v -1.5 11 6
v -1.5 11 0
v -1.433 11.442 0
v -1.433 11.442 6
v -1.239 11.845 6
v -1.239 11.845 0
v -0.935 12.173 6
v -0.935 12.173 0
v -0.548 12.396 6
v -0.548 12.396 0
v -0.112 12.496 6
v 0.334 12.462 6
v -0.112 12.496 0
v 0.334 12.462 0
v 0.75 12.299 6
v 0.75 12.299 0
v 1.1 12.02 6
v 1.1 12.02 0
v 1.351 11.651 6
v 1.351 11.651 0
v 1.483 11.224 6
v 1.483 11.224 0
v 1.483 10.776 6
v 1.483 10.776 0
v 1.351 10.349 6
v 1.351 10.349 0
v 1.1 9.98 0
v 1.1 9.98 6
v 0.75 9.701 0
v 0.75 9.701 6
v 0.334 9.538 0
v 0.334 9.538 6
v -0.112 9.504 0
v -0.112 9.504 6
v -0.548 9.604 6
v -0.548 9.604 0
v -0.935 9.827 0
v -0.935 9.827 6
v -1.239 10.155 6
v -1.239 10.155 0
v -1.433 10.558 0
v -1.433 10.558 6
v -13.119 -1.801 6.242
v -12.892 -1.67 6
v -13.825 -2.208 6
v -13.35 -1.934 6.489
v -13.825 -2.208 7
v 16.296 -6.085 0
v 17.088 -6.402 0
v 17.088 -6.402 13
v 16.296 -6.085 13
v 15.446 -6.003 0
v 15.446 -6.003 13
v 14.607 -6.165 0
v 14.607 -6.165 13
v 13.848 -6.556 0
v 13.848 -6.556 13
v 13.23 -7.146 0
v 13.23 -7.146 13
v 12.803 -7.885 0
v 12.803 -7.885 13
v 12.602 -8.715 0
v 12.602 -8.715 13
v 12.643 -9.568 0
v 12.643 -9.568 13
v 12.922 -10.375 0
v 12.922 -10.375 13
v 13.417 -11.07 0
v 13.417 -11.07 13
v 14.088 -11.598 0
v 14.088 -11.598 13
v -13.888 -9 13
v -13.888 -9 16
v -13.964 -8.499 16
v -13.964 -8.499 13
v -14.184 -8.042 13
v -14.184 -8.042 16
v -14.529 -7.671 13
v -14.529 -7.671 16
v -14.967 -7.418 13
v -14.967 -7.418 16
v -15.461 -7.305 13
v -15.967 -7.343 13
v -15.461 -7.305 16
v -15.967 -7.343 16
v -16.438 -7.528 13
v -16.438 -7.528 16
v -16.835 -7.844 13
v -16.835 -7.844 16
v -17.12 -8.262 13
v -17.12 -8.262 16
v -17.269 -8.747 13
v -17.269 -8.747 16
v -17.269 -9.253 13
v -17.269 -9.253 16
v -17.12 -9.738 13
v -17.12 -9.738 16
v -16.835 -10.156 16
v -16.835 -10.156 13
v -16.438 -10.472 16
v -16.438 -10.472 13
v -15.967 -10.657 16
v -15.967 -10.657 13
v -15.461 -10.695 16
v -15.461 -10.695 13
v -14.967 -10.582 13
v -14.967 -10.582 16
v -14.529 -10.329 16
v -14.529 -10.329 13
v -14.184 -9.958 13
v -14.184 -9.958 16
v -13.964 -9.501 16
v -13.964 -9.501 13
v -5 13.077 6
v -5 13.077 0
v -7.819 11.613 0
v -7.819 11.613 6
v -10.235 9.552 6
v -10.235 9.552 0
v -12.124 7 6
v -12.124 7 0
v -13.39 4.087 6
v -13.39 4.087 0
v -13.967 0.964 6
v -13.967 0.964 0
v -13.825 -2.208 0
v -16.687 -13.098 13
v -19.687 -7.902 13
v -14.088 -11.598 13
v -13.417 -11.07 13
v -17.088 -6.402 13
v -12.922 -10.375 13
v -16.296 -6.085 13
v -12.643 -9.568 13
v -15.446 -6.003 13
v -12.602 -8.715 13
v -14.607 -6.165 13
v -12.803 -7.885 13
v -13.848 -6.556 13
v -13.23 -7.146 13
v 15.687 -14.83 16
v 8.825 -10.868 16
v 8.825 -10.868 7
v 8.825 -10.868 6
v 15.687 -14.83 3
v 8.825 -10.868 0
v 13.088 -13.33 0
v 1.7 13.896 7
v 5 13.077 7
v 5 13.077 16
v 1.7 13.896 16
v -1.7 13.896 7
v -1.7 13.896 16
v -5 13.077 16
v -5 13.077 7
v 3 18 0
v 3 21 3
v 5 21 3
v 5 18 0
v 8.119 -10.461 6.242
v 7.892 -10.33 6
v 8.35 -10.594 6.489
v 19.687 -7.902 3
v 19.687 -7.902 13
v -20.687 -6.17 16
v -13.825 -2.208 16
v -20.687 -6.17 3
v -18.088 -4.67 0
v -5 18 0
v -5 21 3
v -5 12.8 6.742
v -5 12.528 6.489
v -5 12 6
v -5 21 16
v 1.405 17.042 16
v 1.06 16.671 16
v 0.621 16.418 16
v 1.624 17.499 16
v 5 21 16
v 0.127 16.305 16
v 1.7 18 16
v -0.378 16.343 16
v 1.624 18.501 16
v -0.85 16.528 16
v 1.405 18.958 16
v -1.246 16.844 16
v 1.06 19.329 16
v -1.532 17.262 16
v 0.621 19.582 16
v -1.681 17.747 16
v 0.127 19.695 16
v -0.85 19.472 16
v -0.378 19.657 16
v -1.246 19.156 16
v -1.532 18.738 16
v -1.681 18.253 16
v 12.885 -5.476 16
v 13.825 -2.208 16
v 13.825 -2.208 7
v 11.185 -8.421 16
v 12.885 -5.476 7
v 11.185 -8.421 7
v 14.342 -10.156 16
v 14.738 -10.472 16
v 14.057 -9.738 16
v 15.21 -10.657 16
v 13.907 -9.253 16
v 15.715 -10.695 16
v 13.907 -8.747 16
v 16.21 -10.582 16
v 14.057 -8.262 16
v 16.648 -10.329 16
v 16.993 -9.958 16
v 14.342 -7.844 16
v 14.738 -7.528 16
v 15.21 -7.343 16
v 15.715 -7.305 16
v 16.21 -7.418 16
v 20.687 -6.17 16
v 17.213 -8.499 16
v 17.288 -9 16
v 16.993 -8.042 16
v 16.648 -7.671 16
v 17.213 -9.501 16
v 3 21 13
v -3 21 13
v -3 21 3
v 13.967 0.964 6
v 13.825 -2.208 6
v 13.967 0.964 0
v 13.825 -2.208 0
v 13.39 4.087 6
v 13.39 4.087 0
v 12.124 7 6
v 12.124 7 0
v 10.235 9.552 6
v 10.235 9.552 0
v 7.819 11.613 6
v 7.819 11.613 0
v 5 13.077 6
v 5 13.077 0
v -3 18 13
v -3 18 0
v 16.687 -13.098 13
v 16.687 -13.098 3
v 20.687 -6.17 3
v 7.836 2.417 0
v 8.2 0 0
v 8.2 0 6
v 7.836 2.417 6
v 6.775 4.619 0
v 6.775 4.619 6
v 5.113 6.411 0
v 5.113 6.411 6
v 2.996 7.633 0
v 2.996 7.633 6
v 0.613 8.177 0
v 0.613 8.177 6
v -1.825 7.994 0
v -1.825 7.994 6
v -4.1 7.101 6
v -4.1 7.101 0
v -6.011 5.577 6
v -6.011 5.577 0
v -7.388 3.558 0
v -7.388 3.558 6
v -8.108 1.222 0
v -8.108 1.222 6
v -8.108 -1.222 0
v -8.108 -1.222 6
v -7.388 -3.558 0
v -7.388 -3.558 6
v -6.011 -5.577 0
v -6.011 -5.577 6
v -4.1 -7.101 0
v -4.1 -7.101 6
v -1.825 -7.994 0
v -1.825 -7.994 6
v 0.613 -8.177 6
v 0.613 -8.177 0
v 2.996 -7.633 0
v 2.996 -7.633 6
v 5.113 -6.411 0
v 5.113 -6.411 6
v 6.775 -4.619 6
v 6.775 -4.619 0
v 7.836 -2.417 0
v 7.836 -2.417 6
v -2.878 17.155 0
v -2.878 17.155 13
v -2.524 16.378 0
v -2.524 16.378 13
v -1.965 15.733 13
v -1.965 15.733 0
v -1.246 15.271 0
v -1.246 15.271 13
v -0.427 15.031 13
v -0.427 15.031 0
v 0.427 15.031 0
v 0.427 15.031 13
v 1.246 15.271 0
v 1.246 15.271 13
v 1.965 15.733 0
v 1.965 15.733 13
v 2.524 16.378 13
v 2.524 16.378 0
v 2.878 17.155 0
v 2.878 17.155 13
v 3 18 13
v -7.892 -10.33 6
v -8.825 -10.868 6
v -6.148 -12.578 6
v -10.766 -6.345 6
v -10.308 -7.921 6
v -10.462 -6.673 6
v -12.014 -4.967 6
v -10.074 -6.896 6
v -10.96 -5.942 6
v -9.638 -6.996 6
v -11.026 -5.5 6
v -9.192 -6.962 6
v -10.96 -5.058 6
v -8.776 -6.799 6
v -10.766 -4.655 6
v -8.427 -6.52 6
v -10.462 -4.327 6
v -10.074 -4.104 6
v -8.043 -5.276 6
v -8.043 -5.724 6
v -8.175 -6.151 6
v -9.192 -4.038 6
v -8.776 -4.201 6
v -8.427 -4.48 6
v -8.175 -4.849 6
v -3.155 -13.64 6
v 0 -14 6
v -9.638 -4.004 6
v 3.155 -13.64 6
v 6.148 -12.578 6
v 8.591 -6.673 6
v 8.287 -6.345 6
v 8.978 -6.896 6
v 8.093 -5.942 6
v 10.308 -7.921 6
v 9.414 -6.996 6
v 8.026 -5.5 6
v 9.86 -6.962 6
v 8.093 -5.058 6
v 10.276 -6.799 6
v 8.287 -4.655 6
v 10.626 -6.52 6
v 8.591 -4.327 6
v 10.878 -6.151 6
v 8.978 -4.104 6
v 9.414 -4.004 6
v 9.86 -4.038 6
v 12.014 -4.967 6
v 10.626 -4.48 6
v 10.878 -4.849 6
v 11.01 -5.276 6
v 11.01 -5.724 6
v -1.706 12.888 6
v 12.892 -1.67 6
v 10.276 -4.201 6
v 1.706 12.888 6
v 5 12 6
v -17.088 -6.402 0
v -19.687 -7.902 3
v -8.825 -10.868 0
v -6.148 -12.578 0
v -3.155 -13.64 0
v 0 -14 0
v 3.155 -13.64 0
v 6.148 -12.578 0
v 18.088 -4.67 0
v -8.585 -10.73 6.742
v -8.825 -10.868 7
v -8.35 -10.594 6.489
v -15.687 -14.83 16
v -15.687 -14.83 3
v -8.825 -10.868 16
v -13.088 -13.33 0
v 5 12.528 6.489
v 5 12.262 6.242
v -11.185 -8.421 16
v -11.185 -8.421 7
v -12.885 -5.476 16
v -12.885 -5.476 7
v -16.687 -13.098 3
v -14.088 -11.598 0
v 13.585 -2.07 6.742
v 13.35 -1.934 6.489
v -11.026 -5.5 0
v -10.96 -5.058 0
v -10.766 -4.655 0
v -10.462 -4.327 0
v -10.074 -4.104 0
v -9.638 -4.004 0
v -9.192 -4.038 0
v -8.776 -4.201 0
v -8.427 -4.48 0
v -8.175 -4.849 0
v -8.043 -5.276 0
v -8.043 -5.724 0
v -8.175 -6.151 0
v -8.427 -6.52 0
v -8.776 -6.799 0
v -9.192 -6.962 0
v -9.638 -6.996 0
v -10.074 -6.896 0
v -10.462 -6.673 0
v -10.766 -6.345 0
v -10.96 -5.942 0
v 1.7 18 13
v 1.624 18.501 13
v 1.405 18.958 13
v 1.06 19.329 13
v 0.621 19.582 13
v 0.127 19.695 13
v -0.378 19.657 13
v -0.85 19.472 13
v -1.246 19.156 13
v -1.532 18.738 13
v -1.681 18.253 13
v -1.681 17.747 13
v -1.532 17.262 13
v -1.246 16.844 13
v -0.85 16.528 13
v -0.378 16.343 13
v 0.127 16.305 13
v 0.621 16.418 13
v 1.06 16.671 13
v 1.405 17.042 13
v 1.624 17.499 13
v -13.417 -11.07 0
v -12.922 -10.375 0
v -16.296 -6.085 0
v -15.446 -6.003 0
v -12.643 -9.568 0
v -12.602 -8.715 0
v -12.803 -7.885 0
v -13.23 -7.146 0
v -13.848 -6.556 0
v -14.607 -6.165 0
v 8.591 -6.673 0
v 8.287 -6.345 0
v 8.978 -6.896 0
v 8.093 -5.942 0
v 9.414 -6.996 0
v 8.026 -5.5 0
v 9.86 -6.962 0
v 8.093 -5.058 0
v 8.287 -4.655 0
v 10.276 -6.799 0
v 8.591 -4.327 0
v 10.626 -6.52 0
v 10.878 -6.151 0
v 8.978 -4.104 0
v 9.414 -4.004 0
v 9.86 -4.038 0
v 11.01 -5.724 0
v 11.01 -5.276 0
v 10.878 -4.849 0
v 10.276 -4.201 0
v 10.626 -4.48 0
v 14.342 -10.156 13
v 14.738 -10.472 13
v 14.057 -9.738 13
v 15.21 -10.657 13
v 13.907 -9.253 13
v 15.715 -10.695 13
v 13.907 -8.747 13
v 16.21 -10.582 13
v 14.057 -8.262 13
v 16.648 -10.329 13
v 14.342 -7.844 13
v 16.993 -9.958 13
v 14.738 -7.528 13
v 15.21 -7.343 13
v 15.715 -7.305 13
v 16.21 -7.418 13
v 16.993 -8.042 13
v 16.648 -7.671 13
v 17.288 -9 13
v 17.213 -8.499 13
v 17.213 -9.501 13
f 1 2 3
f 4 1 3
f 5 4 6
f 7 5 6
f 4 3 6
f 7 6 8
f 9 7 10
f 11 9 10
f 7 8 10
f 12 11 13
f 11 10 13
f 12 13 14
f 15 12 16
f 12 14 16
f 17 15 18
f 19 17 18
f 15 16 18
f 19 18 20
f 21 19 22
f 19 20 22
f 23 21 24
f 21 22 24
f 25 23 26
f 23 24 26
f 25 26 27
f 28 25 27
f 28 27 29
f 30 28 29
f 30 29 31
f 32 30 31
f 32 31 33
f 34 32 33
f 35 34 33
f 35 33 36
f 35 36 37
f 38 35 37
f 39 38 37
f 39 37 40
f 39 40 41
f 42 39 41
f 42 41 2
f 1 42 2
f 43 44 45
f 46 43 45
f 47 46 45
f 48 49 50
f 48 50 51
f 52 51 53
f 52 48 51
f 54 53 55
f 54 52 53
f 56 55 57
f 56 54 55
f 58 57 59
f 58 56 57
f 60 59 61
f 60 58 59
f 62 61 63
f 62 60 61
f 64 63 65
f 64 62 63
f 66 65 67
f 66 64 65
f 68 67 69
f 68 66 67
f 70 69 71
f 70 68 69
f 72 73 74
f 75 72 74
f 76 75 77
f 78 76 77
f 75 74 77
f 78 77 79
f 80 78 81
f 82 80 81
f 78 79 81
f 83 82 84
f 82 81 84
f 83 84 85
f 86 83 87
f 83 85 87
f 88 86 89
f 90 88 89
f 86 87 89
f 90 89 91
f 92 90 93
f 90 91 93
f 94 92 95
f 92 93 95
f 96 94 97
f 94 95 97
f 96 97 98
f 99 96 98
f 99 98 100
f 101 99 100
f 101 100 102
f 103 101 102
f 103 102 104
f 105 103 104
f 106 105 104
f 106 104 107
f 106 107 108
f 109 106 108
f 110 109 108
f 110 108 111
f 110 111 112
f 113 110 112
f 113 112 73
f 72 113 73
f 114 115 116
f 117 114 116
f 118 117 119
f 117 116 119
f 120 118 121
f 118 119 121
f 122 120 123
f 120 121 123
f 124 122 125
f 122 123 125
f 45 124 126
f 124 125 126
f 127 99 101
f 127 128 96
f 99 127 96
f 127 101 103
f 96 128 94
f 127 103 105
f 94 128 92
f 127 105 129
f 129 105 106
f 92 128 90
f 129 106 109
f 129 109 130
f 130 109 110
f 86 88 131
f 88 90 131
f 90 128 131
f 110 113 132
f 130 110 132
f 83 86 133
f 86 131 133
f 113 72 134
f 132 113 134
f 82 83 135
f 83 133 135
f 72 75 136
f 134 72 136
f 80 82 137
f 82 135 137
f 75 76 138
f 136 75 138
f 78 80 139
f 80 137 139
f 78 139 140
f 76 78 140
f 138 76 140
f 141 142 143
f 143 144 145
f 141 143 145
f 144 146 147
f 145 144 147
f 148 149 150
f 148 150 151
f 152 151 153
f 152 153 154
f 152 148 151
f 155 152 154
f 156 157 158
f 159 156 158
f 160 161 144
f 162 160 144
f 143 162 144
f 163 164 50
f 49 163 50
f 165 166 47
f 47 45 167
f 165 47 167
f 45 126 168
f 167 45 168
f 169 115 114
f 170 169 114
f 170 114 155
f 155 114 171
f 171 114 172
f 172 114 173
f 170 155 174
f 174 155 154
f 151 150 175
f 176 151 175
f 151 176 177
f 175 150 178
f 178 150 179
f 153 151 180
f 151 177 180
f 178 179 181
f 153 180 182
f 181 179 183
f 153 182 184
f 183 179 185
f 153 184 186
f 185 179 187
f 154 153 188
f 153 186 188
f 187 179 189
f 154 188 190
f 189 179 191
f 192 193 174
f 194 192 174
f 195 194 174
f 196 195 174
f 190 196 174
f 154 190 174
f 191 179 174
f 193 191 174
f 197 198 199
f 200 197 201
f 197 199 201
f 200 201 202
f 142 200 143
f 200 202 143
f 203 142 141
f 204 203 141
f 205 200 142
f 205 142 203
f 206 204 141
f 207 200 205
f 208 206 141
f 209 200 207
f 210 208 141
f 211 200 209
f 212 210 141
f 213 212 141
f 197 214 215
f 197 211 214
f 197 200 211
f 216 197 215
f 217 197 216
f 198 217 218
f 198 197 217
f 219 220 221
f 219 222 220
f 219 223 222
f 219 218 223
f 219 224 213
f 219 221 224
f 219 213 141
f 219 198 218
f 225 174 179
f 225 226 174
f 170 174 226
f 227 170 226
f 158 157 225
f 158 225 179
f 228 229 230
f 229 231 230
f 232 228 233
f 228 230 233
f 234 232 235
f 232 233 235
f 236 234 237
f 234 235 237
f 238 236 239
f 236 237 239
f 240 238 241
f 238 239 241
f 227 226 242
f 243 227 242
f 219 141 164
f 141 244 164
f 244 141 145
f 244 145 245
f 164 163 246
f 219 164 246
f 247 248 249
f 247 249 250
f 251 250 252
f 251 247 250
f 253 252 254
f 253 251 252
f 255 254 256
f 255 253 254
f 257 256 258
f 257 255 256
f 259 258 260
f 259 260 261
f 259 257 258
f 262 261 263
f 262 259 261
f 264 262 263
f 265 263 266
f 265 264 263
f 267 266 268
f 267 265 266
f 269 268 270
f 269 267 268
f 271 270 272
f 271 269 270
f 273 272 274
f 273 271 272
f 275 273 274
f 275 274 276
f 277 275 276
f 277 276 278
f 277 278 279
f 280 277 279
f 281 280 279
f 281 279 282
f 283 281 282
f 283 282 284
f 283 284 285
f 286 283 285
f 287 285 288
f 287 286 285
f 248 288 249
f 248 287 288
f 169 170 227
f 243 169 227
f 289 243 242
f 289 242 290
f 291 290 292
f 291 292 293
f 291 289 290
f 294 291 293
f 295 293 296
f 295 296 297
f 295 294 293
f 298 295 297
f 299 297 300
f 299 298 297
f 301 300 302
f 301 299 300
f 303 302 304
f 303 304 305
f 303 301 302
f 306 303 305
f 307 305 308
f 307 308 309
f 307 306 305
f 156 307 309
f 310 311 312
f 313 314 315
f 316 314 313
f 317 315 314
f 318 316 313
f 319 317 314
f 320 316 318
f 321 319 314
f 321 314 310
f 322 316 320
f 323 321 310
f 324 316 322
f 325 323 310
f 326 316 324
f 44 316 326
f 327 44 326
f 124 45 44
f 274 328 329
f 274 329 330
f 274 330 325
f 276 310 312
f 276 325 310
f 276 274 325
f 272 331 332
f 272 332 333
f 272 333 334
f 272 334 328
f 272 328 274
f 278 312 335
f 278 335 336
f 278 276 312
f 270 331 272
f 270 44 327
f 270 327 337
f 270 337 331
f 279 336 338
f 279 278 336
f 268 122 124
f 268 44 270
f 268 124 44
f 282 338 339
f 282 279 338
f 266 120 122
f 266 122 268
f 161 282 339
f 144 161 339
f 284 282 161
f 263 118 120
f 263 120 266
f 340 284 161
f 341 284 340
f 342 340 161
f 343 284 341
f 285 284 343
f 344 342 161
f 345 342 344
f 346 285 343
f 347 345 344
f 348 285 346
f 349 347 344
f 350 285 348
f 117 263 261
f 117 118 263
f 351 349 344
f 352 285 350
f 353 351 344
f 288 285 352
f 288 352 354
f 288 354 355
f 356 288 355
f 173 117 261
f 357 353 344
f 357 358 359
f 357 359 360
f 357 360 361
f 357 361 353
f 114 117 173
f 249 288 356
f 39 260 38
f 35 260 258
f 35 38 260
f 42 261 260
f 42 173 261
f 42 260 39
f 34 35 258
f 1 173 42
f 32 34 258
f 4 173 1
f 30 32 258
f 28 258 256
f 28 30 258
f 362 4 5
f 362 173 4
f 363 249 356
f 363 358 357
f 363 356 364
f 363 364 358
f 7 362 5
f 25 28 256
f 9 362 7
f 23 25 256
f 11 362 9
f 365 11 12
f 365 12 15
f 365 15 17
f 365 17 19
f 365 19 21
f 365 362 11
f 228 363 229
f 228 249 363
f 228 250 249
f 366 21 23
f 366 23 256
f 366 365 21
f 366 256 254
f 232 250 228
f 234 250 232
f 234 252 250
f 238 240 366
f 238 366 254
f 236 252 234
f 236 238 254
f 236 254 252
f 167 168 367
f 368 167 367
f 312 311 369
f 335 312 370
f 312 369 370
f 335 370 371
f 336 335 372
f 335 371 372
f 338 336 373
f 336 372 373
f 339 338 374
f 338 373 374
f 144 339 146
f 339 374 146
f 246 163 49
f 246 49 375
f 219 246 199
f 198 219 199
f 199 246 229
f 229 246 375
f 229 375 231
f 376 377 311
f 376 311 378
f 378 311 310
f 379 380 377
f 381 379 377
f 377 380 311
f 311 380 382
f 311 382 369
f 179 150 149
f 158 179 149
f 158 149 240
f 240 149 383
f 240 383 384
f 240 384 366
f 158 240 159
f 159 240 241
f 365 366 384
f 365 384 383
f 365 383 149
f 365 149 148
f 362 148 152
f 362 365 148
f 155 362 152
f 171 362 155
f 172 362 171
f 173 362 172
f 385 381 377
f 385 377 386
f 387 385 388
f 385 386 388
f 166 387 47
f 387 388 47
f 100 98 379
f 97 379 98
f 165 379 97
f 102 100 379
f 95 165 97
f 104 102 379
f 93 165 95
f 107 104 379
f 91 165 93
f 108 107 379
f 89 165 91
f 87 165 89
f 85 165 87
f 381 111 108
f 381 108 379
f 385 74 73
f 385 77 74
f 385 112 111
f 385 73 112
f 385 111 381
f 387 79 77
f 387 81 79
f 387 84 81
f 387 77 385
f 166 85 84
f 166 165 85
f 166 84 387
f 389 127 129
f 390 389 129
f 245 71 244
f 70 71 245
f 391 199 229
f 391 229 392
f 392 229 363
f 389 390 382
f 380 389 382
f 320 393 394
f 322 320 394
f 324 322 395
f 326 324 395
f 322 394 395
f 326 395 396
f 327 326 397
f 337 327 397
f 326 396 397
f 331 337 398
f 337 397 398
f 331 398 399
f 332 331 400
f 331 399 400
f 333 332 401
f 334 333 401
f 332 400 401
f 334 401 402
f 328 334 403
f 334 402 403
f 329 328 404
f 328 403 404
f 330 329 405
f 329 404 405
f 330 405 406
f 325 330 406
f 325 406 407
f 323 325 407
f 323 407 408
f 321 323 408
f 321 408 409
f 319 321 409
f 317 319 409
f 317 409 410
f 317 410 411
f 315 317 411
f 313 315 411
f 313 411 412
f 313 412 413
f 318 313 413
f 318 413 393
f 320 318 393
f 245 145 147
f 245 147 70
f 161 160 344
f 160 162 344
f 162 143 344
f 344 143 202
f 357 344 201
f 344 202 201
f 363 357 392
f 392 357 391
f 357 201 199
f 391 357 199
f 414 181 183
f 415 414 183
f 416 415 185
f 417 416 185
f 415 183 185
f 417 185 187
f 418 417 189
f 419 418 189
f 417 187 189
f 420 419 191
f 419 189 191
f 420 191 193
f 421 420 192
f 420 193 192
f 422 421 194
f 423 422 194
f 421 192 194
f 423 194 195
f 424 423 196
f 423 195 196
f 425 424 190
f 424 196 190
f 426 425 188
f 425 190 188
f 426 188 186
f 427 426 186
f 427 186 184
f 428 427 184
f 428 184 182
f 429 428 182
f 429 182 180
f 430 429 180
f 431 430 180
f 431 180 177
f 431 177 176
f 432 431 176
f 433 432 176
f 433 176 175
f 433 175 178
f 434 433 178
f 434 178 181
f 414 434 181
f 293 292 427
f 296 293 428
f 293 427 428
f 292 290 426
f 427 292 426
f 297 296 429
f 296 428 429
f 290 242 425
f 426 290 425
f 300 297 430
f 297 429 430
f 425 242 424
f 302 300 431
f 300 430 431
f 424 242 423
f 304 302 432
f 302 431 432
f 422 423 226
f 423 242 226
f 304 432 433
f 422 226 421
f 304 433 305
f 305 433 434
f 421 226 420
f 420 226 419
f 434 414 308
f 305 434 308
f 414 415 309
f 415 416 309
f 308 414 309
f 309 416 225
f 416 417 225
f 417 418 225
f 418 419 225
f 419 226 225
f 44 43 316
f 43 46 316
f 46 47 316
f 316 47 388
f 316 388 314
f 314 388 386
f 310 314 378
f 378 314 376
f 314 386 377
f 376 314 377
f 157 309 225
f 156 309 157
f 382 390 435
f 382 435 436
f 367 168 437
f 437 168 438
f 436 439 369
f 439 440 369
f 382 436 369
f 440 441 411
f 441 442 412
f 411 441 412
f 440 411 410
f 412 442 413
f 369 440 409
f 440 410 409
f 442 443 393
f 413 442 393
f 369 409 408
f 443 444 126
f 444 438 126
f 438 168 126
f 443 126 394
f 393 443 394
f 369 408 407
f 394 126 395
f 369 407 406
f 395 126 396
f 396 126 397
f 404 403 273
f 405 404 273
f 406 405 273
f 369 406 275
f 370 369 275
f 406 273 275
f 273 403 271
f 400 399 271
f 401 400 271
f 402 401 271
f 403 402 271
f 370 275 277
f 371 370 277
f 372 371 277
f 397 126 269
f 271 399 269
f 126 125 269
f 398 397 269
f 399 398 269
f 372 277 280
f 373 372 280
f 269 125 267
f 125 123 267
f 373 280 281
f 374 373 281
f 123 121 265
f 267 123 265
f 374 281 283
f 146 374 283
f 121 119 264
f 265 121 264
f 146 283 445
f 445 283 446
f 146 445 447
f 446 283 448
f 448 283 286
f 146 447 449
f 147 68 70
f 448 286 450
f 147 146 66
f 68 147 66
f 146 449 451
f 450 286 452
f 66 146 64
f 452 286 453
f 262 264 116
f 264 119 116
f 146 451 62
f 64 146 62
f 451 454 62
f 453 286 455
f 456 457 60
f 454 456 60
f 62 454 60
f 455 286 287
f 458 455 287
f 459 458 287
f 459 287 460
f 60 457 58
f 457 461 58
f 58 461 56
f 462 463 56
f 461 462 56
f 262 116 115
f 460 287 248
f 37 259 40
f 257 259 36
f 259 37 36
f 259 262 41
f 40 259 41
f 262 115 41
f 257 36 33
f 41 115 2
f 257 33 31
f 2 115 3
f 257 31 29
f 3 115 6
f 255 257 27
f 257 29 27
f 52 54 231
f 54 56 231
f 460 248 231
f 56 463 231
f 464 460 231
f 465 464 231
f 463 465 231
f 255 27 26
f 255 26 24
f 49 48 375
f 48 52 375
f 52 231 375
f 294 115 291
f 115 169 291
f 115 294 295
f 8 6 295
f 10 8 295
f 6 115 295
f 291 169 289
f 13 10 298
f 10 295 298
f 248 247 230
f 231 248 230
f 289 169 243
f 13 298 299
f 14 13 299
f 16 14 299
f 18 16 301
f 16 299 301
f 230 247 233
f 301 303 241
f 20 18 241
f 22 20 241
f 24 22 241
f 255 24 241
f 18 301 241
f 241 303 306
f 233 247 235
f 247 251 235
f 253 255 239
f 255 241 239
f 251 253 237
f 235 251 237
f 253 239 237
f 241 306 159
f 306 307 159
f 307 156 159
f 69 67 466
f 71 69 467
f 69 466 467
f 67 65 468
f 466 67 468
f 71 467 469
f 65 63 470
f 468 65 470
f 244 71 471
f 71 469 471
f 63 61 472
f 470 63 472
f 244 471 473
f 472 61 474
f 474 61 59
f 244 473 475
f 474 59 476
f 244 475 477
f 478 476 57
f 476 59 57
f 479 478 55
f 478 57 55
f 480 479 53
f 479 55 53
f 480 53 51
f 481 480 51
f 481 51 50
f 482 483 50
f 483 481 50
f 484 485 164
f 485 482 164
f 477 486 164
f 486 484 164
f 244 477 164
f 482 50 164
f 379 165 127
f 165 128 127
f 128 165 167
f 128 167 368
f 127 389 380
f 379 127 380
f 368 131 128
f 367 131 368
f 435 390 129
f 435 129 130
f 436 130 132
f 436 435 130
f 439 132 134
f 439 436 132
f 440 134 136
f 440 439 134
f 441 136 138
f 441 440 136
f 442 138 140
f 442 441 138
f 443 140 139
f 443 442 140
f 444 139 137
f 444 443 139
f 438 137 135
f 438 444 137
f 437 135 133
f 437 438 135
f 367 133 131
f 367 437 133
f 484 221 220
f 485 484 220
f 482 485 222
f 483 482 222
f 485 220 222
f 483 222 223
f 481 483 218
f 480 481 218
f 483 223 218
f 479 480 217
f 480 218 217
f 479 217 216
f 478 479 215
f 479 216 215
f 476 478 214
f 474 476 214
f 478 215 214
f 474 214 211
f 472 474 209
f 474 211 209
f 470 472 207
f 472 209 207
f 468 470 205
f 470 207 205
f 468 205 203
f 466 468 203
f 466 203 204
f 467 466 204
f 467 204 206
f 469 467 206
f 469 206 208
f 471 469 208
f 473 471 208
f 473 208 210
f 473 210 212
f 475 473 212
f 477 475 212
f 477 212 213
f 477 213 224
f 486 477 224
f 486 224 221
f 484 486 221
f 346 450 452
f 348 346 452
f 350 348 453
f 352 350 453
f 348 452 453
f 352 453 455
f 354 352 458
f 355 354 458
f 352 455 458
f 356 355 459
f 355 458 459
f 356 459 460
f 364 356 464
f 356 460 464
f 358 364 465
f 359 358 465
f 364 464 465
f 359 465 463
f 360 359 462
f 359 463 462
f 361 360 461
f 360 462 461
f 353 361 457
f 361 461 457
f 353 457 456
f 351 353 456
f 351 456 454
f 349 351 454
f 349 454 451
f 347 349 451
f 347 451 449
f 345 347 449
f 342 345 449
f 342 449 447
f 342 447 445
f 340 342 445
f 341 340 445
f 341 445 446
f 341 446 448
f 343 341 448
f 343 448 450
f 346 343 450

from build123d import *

# Parameters (mm, degrees)
SKETCH_1_R          = 14
SKETCH_1_R_2        = 8.2
EXTRUDE_1_DEPTH     = 6
EXTRUDE_2_DEPTH     = 16
SKETCH_3_R          = 1.7
CUT_EXTRUDE_1_DEPTH = 34.540015912
SKETCH_4_R          = 1.5
CUT_EXTRUDE_2_DEPTH = 34.540015912
CUT_EXTRUDE_3_DEPTH = 13
CHAMFER_1_SIZE      = 3
CHAMFER_2_SIZE      = 1


with BuildPart() as part:
    # 草圖1 → 填料-伸長1 (new body)
    with BuildSketch(Plane.XY):
        Circle(SKETCH_1_R)
        Circle(SKETCH_1_R_2, mode=Mode.SUBTRACT)
    extrude(amount=EXTRUDE_1_DEPTH)

    # 草圖2 → 填料-伸長2 (add)
    with BuildSketch(Plane.XY):
        with BuildLine():
            Line((20.686533479, -6.169872981), (13.824751653, -2.208221396))
            ThreePointArc((13.824751653, -2.208221396), (12.124355653, -7), (8.824751653, -10.868475434))
            Line((8.824751653, -10.868475434), (15.686533479, -14.830127019))
            Line((15.686533479, -14.830127019), (20.686533479, -6.169872981))
        make_face()
        with BuildLine():
            Line((-5, 21), (5, 21))
            Line((5, 21), (5, 13.076696831))
            ThreePointArc((5, 13.076696831), (0, 14), (-5, 13.076696831))
            Line((-5, 13.076696831), (-5, 21))
        make_face()
        with BuildLine():
            Line((-15.686533479, -14.830127019), (-8.824751653, -10.868475434))
            ThreePointArc((-8.824751653, -10.868475434), (-12.124355653, -7), (-13.824751653, -2.208221396))
            Line((-13.824751653, -2.208221396), (-20.686533479, -6.169872981))
            Line((-20.686533479, -6.169872981), (-15.686533479, -14.830127019))
        make_face()
    extrude(amount=EXTRUDE_2_DEPTH)

    # 草圖3 → 除料-伸長1 (cut, through all)
    with BuildSketch(Plane.XY.offset(16)):
        with Locations((0, 18)):
            Circle(SKETCH_3_R)
        with Locations((15.588457268, -9)):
            Circle(SKETCH_3_R)
        with Locations((-15.588457268, -9)):
            Circle(SKETCH_3_R)
    extrude(amount=-CUT_EXTRUDE_1_DEPTH, mode=Mode.SUBTRACT)

    # 草圖4 → 除料-伸長2 (cut, through all)
    with BuildSketch(Plane(origin=(0, 0, 0), x_dir=(-1, 0, 0), z_dir=(0, 0, -1))):
        with Locations((0, 11)):
            Circle(SKETCH_4_R)
        with Locations((9.526279442, -5.5)):
            Circle(SKETCH_4_R)
        with Locations((-9.526279442, -5.5)):
            Circle(SKETCH_4_R)
    extrude(amount=-CUT_EXTRUDE_2_DEPTH, mode=Mode.SUBTRACT)

    # 草圖5 → 除料-伸長3 (cut)
    with BuildSketch(Plane(origin=(0, 0, 0), x_dir=(-1, 0, 0), z_dir=(0, 0, -1))):
        with BuildLine():
            Line((17.088457268, -6.401923789), (19.686533479, -7.901923789))
            Line((19.686533479, -7.901923789), (16.686533479, -13.098076211))
            Line((16.686533479, -13.098076211), (14.088457268, -11.598076211))
            ThreePointArc((14.088457268, -11.598076211), (12.990381057, -7.5), (17.088457268, -6.401923789))
        make_face()
        with BuildLine():
            Line((-3, 18), (-3, 21))
            Line((-3, 21), (3, 21))
            Line((3, 21), (3, 18))
            ThreePointArc((3, 18), (0, 15), (-3, 18))
        make_face()
        with BuildLine():
            Line((-14.088457268, -11.598076211), (-16.686533479, -13.098076211))
            Line((-16.686533479, -13.098076211), (-19.686533479, -7.901923789))
            Line((-19.686533479, -7.901923789), (-17.088457268, -6.401923789))
            ThreePointArc((-17.088457268, -6.401923789), (-12.990381057, -7.5), (-14.088457268, -11.598076211))
        make_face()
    extrude(amount=-CUT_EXTRUDE_3_DEPTH, mode=Mode.SUBTRACT)

    # 導角1
    chamfer_1_edges = [part.edges().sort_by_distance(p)[0] for p in [
        (4, 21, 0),
        (-4, 21, 0),
        (-20.186533479, -7.035898385, 0),
        (-16.186533479, -13.964101615, 0),
        (20.186533479, -7.035898385, 0),
        (16.186533479, -13.964101615, 0),
    ]]
    chamfer(chamfer_1_edges, length=CHAMFER_1_SIZE)

    # 導角2
    # the kernel refuses this chamfer: 1 mm, written as the material it adds along each edge
    with BuildSketch(Plane(origin=(0, 0, 6), x_dir=(0.4779177917946843, -0.8784045675462375, 0), z_dir=(-0.8784045675462375, -0.4779177917946843, 0))) as chamfer_2_piece_1_section:
        Polygon((14 - CHAMFER_2_SIZE, 0), (14, CHAMFER_2_SIZE), (14, 0), align=None)
    chamfer_2_piece_1 = revolve(axis=Axis((0, 0, 6), (0, 0, 1)), revolution_arc=62.901004407, mode=Mode.PRIVATE)
    chamfer_2_piece_1 = split(chamfer_2_piece_1, bisect_by=Plane(origin=(14.060598585, -2.344387686, 6.333230846), z_dir=(-0.5000000000000002, -0.8660254037844386, 0)), keep=Keep.TOP, mode=Mode.PRIVATE)
    chamfer_2_piece_1 = split(chamfer_2_piece_1, bisect_by=Plane(origin=(9.060598585, -11.004641724, 6.333230846), z_dir=(0.49999999999999956, 0.8660254037844389, 0)), keep=Keep.TOP, mode=Mode.PRIVATE)
    add(chamfer_2_piece_1)
    with BuildSketch(Plane(origin=(0, 0, 6), x_dir=(-0.9996795661926668, 0.025313335158395317, 0), z_dir=(0.025313335158395317, 0.9996795661926668, 0))) as chamfer_2_piece_2_section:
        Polygon((14 - CHAMFER_2_SIZE, 0), (14, CHAMFER_2_SIZE), (14, 0), align=None)
    chamfer_2_piece_2 = revolve(axis=Axis((0, 0, 6), (0, 0, 1)), revolution_arc=62.901004407, mode=Mode.PRIVATE)
    chamfer_2_piece_2 = split(chamfer_2_piece_2, bisect_by=Plane(origin=(-14.060598585, -2.344387686, 6.333230846), z_dir=(0.5000000000000009, -0.8660254037844383, 0)), keep=Keep.TOP, mode=Mode.PRIVATE)
    chamfer_2_piece_2 = split(chamfer_2_piece_2, bisect_by=Plane(origin=(-9.060598585, -11.004641724, 6.333230846), z_dir=(-0.5000000000000003, 0.8660254037844387, 0)), keep=Keep.TOP, mode=Mode.PRIVATE)
    add(chamfer_2_piece_2)
    with BuildSketch(Plane(origin=(0, 0, 6), x_dir=(0.5217617743979716, 0.853091232387885, 0), z_dir=(0.853091232387885, -0.5217617743979716, 0))) as chamfer_2_piece_3_section:
        Polygon((14, CHAMFER_2_SIZE), (14 - CHAMFER_2_SIZE, 0), (14, 0), align=None)
    chamfer_2_piece_3 = revolve(axis=Axis((0, 0, 6), (0, 0, 1)), revolution_arc=62.901004407, mode=Mode.PRIVATE)
    chamfer_2_piece_3 = split(chamfer_2_piece_3, bisect_by=Plane(origin=(5, 13.34902941, 6.333230846), z_dir=(-1, 0, 0)), keep=Keep.TOP, mode=Mode.PRIVATE)
    chamfer_2_piece_3 = split(chamfer_2_piece_3, bisect_by=Plane(origin=(-5, 13.34902941, 6.333230846), z_dir=(1, 0, 0)), keep=Keep.TOP, mode=Mode.PRIVATE)
    add(chamfer_2_piece_3)


solid = part.part
